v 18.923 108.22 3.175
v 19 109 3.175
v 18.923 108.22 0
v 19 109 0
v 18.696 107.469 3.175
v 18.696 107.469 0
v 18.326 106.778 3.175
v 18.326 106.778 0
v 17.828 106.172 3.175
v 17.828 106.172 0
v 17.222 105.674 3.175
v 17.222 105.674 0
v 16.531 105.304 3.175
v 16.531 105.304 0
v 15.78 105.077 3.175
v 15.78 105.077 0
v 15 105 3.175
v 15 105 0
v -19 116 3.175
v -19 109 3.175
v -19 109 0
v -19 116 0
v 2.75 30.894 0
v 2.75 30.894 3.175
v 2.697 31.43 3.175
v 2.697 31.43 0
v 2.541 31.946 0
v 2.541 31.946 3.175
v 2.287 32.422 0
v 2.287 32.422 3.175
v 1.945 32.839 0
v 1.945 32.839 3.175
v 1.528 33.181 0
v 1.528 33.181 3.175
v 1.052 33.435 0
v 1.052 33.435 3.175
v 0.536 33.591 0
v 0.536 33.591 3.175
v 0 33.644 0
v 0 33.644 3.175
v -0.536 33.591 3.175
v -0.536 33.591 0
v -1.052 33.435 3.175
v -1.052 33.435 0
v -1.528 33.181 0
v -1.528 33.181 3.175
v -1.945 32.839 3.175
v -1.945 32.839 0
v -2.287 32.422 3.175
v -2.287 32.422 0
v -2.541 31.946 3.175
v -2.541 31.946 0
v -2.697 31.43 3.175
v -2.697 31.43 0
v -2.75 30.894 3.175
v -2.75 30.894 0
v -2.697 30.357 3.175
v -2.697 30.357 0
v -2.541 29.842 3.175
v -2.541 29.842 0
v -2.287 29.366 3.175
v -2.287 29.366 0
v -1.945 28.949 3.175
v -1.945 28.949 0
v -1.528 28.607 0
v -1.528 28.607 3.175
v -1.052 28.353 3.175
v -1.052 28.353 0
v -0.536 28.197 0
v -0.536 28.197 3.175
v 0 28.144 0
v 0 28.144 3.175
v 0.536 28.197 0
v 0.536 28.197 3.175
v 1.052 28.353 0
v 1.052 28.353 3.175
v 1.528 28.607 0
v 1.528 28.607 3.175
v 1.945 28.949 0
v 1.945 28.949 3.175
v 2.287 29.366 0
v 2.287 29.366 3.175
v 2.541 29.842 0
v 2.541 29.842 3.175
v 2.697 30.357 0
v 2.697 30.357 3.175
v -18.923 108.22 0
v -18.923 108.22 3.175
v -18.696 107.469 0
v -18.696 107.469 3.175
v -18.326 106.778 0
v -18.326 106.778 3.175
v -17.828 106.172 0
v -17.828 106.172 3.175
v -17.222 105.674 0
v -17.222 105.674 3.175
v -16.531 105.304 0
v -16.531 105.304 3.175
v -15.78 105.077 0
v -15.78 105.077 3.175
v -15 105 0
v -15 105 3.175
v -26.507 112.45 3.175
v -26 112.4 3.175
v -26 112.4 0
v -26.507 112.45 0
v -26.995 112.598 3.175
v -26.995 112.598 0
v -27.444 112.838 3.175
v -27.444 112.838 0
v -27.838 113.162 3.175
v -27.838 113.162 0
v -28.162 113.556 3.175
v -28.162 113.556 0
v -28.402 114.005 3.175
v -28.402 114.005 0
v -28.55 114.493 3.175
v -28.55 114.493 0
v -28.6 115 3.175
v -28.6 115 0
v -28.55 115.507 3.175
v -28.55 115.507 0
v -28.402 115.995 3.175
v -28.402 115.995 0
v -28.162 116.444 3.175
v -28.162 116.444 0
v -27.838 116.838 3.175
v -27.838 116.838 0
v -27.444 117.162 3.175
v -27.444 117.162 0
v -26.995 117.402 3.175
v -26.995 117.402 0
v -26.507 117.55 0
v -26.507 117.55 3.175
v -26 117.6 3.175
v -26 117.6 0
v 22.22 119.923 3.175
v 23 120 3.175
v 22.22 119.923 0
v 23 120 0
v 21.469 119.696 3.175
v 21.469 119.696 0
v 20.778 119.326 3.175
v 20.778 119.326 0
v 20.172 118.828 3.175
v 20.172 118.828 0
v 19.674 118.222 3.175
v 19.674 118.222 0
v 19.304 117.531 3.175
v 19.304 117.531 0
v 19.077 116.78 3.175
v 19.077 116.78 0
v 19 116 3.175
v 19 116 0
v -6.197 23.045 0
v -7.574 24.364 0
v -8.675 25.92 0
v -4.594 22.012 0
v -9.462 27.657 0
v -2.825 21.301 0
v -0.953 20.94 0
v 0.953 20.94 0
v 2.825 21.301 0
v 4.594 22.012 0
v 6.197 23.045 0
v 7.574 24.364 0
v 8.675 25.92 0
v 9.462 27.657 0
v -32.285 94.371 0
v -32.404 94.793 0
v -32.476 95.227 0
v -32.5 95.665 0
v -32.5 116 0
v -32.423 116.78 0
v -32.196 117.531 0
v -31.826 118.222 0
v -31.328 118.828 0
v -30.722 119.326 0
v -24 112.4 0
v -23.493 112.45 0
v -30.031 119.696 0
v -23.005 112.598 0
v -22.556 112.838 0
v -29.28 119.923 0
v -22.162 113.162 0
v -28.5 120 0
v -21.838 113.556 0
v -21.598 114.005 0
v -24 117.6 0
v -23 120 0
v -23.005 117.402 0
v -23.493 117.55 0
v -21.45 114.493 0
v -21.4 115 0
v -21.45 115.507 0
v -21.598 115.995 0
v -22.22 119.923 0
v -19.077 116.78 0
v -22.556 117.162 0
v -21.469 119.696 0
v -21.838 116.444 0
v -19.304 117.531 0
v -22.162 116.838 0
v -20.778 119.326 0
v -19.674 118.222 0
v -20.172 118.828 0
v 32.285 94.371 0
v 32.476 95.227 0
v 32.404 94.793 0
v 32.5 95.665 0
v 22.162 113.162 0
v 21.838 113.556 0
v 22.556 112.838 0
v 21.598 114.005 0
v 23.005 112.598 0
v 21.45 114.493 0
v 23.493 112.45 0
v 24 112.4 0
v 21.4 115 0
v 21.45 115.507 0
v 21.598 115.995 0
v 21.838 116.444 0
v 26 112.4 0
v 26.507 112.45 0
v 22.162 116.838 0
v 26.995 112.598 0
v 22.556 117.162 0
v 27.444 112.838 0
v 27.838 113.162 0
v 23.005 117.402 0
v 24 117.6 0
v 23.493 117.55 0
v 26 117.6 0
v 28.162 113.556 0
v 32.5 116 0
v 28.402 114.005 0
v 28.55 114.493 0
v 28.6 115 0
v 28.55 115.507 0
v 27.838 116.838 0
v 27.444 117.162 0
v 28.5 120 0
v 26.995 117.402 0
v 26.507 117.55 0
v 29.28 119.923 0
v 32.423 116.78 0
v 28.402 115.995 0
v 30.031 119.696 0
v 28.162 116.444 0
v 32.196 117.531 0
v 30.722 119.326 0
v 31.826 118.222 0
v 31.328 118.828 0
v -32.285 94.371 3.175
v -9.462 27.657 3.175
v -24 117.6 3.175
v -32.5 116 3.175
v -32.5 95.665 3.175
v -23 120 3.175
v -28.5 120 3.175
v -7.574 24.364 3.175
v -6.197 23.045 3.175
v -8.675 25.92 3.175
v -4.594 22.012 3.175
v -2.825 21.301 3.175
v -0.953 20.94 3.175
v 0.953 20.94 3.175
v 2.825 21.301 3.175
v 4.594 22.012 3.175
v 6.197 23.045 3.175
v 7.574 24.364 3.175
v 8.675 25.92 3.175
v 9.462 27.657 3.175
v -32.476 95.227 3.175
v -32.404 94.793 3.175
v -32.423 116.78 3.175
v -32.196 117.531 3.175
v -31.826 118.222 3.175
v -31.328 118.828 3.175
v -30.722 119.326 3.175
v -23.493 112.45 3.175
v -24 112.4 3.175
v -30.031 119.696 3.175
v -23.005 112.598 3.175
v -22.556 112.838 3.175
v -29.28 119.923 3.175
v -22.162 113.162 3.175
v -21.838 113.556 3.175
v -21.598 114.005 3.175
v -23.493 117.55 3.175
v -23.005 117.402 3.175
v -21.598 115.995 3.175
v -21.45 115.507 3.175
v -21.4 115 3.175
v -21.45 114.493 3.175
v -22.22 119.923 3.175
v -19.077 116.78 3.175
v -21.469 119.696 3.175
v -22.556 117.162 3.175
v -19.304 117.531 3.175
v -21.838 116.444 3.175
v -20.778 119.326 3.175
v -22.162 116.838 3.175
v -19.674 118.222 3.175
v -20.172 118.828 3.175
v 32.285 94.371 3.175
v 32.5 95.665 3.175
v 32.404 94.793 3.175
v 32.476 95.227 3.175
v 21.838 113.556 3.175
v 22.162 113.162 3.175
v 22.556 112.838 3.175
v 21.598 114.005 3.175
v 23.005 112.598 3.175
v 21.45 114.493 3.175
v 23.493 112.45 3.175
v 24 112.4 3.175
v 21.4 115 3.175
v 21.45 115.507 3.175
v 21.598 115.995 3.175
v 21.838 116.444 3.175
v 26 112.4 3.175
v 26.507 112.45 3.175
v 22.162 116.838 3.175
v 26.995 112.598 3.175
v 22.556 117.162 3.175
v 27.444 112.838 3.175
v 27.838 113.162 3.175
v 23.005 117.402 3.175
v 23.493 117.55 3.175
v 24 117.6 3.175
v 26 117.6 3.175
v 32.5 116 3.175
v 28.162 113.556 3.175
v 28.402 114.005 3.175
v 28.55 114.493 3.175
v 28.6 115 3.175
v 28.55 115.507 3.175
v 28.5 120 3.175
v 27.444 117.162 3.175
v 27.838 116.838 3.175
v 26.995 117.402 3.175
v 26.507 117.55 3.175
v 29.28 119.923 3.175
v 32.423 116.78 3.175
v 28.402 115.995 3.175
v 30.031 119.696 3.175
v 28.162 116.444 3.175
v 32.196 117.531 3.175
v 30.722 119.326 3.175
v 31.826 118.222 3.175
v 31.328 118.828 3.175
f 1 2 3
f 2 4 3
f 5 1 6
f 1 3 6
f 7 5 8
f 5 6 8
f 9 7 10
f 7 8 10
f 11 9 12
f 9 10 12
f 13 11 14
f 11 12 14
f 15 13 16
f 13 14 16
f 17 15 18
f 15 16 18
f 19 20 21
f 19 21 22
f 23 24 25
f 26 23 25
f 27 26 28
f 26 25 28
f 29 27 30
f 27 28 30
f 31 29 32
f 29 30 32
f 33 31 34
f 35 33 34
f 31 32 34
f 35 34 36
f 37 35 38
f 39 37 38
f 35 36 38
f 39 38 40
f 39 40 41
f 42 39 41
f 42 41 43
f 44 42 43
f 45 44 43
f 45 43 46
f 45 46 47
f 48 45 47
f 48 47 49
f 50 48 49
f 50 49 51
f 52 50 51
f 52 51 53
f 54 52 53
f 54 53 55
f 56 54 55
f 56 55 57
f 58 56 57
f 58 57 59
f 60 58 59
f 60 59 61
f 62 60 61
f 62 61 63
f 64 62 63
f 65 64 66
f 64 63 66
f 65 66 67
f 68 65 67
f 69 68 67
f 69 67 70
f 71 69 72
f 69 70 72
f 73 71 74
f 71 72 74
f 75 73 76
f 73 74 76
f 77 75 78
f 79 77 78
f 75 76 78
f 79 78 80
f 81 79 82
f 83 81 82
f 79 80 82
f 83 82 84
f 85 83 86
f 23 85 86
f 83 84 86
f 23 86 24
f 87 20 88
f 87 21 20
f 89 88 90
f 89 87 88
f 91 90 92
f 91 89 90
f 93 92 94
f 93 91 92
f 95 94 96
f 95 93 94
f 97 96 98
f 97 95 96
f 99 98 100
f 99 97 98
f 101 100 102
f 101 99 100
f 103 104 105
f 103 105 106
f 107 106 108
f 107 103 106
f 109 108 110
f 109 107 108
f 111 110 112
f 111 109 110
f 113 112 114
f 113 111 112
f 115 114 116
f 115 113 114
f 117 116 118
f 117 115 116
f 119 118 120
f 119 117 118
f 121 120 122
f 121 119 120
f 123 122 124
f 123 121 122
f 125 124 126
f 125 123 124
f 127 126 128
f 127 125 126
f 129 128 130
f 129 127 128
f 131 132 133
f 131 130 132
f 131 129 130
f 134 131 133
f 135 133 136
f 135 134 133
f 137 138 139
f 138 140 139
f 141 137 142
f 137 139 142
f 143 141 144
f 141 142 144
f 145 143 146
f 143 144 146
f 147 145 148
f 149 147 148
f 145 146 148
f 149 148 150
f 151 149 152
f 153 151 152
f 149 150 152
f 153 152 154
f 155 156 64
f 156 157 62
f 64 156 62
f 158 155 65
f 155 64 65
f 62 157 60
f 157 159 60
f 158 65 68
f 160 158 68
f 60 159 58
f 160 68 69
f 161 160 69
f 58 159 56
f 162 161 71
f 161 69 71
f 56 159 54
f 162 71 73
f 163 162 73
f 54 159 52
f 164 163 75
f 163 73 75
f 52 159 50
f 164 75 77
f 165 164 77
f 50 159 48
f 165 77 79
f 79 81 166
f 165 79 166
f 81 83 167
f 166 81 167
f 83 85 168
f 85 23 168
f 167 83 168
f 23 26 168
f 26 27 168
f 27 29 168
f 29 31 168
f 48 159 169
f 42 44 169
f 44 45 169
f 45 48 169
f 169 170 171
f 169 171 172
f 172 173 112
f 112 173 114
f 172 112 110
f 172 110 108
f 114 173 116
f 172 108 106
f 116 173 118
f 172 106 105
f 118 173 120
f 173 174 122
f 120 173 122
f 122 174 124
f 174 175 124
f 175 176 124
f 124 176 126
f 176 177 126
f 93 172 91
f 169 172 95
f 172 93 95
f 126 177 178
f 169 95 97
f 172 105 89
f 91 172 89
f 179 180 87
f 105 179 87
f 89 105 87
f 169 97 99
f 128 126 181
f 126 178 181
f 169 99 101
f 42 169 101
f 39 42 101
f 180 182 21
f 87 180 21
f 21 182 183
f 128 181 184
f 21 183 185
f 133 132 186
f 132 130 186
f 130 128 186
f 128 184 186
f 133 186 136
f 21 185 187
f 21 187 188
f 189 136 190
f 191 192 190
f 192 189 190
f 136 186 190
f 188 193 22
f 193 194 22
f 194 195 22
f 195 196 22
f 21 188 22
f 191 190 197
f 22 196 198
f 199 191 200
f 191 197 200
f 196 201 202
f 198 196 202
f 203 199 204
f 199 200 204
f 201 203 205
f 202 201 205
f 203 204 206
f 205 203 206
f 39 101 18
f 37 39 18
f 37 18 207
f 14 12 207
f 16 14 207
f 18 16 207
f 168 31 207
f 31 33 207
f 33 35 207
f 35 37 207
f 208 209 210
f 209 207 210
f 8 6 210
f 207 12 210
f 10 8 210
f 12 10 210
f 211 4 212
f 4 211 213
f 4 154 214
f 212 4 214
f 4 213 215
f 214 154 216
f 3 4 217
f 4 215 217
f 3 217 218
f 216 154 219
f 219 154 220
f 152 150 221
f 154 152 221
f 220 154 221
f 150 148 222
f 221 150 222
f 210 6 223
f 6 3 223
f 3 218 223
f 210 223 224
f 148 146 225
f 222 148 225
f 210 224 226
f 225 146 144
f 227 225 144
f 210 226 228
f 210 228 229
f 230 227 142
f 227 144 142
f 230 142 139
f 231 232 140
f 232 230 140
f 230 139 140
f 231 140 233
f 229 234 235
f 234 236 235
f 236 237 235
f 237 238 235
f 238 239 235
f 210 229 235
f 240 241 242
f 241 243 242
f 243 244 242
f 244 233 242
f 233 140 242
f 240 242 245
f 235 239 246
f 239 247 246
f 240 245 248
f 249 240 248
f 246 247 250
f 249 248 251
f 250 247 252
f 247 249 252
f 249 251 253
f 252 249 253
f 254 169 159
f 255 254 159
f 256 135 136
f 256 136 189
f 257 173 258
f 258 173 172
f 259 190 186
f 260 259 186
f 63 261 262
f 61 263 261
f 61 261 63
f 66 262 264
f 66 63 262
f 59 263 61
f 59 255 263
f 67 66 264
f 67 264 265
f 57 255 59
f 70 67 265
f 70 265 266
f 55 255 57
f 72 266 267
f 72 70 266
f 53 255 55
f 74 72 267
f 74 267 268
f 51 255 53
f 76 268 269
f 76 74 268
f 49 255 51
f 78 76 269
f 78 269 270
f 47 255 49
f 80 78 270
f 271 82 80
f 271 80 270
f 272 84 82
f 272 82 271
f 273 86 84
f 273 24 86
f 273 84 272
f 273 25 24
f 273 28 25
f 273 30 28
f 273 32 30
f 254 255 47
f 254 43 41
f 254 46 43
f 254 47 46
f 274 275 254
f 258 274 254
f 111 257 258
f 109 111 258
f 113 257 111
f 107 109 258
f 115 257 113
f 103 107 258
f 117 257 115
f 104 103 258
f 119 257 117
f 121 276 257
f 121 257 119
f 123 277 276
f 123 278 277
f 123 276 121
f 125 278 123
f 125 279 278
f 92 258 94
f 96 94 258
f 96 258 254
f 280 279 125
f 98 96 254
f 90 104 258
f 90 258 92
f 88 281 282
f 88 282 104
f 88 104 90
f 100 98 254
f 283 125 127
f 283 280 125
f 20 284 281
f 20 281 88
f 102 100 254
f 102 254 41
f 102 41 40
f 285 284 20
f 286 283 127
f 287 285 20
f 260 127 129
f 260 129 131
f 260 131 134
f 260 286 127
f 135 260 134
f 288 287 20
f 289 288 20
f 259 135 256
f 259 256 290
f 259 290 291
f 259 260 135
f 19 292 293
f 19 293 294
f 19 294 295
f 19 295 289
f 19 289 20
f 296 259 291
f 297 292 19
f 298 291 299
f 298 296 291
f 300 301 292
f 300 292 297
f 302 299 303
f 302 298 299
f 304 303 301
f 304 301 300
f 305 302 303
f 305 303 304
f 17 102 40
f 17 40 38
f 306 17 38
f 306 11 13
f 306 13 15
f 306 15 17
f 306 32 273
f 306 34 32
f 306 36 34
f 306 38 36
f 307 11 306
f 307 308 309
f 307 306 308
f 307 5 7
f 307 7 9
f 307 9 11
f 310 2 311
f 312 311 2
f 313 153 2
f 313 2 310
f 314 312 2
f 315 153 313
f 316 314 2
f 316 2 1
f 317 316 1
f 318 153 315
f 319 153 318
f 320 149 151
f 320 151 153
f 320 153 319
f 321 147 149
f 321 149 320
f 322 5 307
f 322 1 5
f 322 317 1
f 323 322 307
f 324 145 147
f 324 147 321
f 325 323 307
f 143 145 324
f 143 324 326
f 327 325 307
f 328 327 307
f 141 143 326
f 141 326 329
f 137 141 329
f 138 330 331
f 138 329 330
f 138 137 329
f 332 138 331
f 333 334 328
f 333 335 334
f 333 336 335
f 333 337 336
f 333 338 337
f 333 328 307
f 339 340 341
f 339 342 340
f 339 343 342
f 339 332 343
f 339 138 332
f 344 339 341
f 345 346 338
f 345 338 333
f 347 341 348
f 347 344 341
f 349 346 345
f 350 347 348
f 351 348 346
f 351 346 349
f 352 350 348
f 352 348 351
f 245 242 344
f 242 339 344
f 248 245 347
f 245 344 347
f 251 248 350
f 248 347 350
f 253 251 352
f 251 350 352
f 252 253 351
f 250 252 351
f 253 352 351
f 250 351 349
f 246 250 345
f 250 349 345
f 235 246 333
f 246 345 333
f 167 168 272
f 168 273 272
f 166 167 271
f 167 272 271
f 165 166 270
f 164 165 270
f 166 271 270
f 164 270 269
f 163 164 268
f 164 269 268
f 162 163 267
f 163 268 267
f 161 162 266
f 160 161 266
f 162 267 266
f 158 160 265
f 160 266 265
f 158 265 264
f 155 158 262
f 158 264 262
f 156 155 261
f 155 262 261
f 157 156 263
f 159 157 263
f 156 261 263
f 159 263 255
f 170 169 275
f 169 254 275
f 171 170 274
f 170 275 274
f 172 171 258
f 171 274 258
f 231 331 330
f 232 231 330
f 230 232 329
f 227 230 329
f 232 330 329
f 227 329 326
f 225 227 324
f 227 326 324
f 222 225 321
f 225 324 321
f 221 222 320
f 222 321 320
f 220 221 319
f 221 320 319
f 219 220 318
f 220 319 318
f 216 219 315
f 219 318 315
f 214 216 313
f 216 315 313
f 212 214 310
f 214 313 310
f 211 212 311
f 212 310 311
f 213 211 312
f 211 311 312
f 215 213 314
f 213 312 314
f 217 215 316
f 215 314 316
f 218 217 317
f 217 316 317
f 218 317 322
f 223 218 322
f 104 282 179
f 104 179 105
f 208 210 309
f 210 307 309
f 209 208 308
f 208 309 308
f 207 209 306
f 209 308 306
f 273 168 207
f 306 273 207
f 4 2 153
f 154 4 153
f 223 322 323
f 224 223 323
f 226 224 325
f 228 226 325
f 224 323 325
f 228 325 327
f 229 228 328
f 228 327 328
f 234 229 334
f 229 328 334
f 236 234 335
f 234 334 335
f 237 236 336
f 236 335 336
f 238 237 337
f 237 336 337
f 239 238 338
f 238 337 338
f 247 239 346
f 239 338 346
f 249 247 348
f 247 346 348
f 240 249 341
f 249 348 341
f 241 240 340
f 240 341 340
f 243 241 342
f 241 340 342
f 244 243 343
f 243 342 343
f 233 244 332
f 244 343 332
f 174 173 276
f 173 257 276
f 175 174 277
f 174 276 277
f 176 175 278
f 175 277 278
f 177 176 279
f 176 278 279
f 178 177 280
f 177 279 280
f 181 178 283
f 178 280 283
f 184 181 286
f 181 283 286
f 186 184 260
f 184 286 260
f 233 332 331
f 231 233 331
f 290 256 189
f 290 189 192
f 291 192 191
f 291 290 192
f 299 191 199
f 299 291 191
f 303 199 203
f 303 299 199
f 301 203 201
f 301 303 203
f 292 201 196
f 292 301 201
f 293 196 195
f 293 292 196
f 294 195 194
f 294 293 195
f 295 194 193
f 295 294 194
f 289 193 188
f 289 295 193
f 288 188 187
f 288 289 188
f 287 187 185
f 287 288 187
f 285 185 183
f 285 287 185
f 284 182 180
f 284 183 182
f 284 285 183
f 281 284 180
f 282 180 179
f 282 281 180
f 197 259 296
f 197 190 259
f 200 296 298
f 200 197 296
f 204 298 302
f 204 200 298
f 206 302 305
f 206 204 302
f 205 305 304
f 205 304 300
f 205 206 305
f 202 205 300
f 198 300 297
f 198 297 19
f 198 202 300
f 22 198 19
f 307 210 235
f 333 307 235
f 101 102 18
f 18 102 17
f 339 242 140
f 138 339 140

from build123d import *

# Parameters (mm, degrees)
BOSS_EXTRUDE1_DEPTH = 3.175
SKETCH2_W           = 38
SKETCH2_H           = 15
CUT_EXTRUDE1_DEPTH  = 4.175
FILLET1_R           = 4
FILLET2_R           = 10
SKETCH3_R           = 2.75
CUT_EXTRUDE2_DEPTH  = 4.175


with BuildPart() as part:
    # Sketch1 → Boss-Extrude1 (new body)
    with BuildSketch(Plane.XY):
        Polygon((32.5, 120), (-32.5, 120), (-32.5, 95), (0, 0), (32.5, 95), align=None)
    extrude(amount=BOSS_EXTRUDE1_DEPTH)

    # Sketch2 → Cut-Extrude1 (cut, through all)
    with BuildSketch(Plane.XY.offset(3.175)):
        with Locations((0, 112.5)):
            Rectangle(SKETCH2_W, SKETCH2_H)
        with BuildLine():
            Line((-26, 117.6), (-24, 117.6))
            ThreePointArc((-24, 117.6), (-21.4, 115), (-24, 112.4))
            Line((-24, 112.4), (-26, 112.4))
            ThreePointArc((-26, 112.4), (-28.6, 115), (-26, 117.6))
        make_face()
        with BuildLine():
            Line((26, 117.6), (24, 117.6))
            ThreePointArc((24, 117.6), (21.4, 115), (24, 112.4))
            Line((24, 112.4), (26, 112.4))
            ThreePointArc((26, 112.4), (28.6, 115), (26, 117.6))
        make_face()
    extrude(amount=-CUT_EXTRUDE1_DEPTH, mode=Mode.SUBTRACT)

    # Fillet1
    fillet1_edges = [part.edges().sort_by_distance(p)[0] for p in [
        (-19, 105, 1.5875),
        (-19, 120, 1.5875),
        (19, 120, 1.5875),
        (19, 105, 1.5875),
        (-32.5, 95, 1.5875),
        (-32.5, 120, 1.5875),
        (32.5, 120, 1.5875),
        (32.5, 95, 1.5875),
    ]]
    fillet(fillet1_edges, radius=FILLET1_R)

    # Fillet2
    fillet2_edges = [part.edges().sort_by_distance(p)[0] for p in [
        (0, 0, 1.5875),
    ]]
    fillet(fillet2_edges, radius=FILLET2_R)

    # Sketch3 → Cut-Extrude2 (cut, through all)
    with BuildSketch(Plane.XY.offset(3.175)):
        with Locations((0, 30.893977889)):
            Circle(SKETCH3_R)
    extrude(amount=-CUT_EXTRUDE2_DEPTH, mode=Mode.SUBTRACT)


solid = part.part
